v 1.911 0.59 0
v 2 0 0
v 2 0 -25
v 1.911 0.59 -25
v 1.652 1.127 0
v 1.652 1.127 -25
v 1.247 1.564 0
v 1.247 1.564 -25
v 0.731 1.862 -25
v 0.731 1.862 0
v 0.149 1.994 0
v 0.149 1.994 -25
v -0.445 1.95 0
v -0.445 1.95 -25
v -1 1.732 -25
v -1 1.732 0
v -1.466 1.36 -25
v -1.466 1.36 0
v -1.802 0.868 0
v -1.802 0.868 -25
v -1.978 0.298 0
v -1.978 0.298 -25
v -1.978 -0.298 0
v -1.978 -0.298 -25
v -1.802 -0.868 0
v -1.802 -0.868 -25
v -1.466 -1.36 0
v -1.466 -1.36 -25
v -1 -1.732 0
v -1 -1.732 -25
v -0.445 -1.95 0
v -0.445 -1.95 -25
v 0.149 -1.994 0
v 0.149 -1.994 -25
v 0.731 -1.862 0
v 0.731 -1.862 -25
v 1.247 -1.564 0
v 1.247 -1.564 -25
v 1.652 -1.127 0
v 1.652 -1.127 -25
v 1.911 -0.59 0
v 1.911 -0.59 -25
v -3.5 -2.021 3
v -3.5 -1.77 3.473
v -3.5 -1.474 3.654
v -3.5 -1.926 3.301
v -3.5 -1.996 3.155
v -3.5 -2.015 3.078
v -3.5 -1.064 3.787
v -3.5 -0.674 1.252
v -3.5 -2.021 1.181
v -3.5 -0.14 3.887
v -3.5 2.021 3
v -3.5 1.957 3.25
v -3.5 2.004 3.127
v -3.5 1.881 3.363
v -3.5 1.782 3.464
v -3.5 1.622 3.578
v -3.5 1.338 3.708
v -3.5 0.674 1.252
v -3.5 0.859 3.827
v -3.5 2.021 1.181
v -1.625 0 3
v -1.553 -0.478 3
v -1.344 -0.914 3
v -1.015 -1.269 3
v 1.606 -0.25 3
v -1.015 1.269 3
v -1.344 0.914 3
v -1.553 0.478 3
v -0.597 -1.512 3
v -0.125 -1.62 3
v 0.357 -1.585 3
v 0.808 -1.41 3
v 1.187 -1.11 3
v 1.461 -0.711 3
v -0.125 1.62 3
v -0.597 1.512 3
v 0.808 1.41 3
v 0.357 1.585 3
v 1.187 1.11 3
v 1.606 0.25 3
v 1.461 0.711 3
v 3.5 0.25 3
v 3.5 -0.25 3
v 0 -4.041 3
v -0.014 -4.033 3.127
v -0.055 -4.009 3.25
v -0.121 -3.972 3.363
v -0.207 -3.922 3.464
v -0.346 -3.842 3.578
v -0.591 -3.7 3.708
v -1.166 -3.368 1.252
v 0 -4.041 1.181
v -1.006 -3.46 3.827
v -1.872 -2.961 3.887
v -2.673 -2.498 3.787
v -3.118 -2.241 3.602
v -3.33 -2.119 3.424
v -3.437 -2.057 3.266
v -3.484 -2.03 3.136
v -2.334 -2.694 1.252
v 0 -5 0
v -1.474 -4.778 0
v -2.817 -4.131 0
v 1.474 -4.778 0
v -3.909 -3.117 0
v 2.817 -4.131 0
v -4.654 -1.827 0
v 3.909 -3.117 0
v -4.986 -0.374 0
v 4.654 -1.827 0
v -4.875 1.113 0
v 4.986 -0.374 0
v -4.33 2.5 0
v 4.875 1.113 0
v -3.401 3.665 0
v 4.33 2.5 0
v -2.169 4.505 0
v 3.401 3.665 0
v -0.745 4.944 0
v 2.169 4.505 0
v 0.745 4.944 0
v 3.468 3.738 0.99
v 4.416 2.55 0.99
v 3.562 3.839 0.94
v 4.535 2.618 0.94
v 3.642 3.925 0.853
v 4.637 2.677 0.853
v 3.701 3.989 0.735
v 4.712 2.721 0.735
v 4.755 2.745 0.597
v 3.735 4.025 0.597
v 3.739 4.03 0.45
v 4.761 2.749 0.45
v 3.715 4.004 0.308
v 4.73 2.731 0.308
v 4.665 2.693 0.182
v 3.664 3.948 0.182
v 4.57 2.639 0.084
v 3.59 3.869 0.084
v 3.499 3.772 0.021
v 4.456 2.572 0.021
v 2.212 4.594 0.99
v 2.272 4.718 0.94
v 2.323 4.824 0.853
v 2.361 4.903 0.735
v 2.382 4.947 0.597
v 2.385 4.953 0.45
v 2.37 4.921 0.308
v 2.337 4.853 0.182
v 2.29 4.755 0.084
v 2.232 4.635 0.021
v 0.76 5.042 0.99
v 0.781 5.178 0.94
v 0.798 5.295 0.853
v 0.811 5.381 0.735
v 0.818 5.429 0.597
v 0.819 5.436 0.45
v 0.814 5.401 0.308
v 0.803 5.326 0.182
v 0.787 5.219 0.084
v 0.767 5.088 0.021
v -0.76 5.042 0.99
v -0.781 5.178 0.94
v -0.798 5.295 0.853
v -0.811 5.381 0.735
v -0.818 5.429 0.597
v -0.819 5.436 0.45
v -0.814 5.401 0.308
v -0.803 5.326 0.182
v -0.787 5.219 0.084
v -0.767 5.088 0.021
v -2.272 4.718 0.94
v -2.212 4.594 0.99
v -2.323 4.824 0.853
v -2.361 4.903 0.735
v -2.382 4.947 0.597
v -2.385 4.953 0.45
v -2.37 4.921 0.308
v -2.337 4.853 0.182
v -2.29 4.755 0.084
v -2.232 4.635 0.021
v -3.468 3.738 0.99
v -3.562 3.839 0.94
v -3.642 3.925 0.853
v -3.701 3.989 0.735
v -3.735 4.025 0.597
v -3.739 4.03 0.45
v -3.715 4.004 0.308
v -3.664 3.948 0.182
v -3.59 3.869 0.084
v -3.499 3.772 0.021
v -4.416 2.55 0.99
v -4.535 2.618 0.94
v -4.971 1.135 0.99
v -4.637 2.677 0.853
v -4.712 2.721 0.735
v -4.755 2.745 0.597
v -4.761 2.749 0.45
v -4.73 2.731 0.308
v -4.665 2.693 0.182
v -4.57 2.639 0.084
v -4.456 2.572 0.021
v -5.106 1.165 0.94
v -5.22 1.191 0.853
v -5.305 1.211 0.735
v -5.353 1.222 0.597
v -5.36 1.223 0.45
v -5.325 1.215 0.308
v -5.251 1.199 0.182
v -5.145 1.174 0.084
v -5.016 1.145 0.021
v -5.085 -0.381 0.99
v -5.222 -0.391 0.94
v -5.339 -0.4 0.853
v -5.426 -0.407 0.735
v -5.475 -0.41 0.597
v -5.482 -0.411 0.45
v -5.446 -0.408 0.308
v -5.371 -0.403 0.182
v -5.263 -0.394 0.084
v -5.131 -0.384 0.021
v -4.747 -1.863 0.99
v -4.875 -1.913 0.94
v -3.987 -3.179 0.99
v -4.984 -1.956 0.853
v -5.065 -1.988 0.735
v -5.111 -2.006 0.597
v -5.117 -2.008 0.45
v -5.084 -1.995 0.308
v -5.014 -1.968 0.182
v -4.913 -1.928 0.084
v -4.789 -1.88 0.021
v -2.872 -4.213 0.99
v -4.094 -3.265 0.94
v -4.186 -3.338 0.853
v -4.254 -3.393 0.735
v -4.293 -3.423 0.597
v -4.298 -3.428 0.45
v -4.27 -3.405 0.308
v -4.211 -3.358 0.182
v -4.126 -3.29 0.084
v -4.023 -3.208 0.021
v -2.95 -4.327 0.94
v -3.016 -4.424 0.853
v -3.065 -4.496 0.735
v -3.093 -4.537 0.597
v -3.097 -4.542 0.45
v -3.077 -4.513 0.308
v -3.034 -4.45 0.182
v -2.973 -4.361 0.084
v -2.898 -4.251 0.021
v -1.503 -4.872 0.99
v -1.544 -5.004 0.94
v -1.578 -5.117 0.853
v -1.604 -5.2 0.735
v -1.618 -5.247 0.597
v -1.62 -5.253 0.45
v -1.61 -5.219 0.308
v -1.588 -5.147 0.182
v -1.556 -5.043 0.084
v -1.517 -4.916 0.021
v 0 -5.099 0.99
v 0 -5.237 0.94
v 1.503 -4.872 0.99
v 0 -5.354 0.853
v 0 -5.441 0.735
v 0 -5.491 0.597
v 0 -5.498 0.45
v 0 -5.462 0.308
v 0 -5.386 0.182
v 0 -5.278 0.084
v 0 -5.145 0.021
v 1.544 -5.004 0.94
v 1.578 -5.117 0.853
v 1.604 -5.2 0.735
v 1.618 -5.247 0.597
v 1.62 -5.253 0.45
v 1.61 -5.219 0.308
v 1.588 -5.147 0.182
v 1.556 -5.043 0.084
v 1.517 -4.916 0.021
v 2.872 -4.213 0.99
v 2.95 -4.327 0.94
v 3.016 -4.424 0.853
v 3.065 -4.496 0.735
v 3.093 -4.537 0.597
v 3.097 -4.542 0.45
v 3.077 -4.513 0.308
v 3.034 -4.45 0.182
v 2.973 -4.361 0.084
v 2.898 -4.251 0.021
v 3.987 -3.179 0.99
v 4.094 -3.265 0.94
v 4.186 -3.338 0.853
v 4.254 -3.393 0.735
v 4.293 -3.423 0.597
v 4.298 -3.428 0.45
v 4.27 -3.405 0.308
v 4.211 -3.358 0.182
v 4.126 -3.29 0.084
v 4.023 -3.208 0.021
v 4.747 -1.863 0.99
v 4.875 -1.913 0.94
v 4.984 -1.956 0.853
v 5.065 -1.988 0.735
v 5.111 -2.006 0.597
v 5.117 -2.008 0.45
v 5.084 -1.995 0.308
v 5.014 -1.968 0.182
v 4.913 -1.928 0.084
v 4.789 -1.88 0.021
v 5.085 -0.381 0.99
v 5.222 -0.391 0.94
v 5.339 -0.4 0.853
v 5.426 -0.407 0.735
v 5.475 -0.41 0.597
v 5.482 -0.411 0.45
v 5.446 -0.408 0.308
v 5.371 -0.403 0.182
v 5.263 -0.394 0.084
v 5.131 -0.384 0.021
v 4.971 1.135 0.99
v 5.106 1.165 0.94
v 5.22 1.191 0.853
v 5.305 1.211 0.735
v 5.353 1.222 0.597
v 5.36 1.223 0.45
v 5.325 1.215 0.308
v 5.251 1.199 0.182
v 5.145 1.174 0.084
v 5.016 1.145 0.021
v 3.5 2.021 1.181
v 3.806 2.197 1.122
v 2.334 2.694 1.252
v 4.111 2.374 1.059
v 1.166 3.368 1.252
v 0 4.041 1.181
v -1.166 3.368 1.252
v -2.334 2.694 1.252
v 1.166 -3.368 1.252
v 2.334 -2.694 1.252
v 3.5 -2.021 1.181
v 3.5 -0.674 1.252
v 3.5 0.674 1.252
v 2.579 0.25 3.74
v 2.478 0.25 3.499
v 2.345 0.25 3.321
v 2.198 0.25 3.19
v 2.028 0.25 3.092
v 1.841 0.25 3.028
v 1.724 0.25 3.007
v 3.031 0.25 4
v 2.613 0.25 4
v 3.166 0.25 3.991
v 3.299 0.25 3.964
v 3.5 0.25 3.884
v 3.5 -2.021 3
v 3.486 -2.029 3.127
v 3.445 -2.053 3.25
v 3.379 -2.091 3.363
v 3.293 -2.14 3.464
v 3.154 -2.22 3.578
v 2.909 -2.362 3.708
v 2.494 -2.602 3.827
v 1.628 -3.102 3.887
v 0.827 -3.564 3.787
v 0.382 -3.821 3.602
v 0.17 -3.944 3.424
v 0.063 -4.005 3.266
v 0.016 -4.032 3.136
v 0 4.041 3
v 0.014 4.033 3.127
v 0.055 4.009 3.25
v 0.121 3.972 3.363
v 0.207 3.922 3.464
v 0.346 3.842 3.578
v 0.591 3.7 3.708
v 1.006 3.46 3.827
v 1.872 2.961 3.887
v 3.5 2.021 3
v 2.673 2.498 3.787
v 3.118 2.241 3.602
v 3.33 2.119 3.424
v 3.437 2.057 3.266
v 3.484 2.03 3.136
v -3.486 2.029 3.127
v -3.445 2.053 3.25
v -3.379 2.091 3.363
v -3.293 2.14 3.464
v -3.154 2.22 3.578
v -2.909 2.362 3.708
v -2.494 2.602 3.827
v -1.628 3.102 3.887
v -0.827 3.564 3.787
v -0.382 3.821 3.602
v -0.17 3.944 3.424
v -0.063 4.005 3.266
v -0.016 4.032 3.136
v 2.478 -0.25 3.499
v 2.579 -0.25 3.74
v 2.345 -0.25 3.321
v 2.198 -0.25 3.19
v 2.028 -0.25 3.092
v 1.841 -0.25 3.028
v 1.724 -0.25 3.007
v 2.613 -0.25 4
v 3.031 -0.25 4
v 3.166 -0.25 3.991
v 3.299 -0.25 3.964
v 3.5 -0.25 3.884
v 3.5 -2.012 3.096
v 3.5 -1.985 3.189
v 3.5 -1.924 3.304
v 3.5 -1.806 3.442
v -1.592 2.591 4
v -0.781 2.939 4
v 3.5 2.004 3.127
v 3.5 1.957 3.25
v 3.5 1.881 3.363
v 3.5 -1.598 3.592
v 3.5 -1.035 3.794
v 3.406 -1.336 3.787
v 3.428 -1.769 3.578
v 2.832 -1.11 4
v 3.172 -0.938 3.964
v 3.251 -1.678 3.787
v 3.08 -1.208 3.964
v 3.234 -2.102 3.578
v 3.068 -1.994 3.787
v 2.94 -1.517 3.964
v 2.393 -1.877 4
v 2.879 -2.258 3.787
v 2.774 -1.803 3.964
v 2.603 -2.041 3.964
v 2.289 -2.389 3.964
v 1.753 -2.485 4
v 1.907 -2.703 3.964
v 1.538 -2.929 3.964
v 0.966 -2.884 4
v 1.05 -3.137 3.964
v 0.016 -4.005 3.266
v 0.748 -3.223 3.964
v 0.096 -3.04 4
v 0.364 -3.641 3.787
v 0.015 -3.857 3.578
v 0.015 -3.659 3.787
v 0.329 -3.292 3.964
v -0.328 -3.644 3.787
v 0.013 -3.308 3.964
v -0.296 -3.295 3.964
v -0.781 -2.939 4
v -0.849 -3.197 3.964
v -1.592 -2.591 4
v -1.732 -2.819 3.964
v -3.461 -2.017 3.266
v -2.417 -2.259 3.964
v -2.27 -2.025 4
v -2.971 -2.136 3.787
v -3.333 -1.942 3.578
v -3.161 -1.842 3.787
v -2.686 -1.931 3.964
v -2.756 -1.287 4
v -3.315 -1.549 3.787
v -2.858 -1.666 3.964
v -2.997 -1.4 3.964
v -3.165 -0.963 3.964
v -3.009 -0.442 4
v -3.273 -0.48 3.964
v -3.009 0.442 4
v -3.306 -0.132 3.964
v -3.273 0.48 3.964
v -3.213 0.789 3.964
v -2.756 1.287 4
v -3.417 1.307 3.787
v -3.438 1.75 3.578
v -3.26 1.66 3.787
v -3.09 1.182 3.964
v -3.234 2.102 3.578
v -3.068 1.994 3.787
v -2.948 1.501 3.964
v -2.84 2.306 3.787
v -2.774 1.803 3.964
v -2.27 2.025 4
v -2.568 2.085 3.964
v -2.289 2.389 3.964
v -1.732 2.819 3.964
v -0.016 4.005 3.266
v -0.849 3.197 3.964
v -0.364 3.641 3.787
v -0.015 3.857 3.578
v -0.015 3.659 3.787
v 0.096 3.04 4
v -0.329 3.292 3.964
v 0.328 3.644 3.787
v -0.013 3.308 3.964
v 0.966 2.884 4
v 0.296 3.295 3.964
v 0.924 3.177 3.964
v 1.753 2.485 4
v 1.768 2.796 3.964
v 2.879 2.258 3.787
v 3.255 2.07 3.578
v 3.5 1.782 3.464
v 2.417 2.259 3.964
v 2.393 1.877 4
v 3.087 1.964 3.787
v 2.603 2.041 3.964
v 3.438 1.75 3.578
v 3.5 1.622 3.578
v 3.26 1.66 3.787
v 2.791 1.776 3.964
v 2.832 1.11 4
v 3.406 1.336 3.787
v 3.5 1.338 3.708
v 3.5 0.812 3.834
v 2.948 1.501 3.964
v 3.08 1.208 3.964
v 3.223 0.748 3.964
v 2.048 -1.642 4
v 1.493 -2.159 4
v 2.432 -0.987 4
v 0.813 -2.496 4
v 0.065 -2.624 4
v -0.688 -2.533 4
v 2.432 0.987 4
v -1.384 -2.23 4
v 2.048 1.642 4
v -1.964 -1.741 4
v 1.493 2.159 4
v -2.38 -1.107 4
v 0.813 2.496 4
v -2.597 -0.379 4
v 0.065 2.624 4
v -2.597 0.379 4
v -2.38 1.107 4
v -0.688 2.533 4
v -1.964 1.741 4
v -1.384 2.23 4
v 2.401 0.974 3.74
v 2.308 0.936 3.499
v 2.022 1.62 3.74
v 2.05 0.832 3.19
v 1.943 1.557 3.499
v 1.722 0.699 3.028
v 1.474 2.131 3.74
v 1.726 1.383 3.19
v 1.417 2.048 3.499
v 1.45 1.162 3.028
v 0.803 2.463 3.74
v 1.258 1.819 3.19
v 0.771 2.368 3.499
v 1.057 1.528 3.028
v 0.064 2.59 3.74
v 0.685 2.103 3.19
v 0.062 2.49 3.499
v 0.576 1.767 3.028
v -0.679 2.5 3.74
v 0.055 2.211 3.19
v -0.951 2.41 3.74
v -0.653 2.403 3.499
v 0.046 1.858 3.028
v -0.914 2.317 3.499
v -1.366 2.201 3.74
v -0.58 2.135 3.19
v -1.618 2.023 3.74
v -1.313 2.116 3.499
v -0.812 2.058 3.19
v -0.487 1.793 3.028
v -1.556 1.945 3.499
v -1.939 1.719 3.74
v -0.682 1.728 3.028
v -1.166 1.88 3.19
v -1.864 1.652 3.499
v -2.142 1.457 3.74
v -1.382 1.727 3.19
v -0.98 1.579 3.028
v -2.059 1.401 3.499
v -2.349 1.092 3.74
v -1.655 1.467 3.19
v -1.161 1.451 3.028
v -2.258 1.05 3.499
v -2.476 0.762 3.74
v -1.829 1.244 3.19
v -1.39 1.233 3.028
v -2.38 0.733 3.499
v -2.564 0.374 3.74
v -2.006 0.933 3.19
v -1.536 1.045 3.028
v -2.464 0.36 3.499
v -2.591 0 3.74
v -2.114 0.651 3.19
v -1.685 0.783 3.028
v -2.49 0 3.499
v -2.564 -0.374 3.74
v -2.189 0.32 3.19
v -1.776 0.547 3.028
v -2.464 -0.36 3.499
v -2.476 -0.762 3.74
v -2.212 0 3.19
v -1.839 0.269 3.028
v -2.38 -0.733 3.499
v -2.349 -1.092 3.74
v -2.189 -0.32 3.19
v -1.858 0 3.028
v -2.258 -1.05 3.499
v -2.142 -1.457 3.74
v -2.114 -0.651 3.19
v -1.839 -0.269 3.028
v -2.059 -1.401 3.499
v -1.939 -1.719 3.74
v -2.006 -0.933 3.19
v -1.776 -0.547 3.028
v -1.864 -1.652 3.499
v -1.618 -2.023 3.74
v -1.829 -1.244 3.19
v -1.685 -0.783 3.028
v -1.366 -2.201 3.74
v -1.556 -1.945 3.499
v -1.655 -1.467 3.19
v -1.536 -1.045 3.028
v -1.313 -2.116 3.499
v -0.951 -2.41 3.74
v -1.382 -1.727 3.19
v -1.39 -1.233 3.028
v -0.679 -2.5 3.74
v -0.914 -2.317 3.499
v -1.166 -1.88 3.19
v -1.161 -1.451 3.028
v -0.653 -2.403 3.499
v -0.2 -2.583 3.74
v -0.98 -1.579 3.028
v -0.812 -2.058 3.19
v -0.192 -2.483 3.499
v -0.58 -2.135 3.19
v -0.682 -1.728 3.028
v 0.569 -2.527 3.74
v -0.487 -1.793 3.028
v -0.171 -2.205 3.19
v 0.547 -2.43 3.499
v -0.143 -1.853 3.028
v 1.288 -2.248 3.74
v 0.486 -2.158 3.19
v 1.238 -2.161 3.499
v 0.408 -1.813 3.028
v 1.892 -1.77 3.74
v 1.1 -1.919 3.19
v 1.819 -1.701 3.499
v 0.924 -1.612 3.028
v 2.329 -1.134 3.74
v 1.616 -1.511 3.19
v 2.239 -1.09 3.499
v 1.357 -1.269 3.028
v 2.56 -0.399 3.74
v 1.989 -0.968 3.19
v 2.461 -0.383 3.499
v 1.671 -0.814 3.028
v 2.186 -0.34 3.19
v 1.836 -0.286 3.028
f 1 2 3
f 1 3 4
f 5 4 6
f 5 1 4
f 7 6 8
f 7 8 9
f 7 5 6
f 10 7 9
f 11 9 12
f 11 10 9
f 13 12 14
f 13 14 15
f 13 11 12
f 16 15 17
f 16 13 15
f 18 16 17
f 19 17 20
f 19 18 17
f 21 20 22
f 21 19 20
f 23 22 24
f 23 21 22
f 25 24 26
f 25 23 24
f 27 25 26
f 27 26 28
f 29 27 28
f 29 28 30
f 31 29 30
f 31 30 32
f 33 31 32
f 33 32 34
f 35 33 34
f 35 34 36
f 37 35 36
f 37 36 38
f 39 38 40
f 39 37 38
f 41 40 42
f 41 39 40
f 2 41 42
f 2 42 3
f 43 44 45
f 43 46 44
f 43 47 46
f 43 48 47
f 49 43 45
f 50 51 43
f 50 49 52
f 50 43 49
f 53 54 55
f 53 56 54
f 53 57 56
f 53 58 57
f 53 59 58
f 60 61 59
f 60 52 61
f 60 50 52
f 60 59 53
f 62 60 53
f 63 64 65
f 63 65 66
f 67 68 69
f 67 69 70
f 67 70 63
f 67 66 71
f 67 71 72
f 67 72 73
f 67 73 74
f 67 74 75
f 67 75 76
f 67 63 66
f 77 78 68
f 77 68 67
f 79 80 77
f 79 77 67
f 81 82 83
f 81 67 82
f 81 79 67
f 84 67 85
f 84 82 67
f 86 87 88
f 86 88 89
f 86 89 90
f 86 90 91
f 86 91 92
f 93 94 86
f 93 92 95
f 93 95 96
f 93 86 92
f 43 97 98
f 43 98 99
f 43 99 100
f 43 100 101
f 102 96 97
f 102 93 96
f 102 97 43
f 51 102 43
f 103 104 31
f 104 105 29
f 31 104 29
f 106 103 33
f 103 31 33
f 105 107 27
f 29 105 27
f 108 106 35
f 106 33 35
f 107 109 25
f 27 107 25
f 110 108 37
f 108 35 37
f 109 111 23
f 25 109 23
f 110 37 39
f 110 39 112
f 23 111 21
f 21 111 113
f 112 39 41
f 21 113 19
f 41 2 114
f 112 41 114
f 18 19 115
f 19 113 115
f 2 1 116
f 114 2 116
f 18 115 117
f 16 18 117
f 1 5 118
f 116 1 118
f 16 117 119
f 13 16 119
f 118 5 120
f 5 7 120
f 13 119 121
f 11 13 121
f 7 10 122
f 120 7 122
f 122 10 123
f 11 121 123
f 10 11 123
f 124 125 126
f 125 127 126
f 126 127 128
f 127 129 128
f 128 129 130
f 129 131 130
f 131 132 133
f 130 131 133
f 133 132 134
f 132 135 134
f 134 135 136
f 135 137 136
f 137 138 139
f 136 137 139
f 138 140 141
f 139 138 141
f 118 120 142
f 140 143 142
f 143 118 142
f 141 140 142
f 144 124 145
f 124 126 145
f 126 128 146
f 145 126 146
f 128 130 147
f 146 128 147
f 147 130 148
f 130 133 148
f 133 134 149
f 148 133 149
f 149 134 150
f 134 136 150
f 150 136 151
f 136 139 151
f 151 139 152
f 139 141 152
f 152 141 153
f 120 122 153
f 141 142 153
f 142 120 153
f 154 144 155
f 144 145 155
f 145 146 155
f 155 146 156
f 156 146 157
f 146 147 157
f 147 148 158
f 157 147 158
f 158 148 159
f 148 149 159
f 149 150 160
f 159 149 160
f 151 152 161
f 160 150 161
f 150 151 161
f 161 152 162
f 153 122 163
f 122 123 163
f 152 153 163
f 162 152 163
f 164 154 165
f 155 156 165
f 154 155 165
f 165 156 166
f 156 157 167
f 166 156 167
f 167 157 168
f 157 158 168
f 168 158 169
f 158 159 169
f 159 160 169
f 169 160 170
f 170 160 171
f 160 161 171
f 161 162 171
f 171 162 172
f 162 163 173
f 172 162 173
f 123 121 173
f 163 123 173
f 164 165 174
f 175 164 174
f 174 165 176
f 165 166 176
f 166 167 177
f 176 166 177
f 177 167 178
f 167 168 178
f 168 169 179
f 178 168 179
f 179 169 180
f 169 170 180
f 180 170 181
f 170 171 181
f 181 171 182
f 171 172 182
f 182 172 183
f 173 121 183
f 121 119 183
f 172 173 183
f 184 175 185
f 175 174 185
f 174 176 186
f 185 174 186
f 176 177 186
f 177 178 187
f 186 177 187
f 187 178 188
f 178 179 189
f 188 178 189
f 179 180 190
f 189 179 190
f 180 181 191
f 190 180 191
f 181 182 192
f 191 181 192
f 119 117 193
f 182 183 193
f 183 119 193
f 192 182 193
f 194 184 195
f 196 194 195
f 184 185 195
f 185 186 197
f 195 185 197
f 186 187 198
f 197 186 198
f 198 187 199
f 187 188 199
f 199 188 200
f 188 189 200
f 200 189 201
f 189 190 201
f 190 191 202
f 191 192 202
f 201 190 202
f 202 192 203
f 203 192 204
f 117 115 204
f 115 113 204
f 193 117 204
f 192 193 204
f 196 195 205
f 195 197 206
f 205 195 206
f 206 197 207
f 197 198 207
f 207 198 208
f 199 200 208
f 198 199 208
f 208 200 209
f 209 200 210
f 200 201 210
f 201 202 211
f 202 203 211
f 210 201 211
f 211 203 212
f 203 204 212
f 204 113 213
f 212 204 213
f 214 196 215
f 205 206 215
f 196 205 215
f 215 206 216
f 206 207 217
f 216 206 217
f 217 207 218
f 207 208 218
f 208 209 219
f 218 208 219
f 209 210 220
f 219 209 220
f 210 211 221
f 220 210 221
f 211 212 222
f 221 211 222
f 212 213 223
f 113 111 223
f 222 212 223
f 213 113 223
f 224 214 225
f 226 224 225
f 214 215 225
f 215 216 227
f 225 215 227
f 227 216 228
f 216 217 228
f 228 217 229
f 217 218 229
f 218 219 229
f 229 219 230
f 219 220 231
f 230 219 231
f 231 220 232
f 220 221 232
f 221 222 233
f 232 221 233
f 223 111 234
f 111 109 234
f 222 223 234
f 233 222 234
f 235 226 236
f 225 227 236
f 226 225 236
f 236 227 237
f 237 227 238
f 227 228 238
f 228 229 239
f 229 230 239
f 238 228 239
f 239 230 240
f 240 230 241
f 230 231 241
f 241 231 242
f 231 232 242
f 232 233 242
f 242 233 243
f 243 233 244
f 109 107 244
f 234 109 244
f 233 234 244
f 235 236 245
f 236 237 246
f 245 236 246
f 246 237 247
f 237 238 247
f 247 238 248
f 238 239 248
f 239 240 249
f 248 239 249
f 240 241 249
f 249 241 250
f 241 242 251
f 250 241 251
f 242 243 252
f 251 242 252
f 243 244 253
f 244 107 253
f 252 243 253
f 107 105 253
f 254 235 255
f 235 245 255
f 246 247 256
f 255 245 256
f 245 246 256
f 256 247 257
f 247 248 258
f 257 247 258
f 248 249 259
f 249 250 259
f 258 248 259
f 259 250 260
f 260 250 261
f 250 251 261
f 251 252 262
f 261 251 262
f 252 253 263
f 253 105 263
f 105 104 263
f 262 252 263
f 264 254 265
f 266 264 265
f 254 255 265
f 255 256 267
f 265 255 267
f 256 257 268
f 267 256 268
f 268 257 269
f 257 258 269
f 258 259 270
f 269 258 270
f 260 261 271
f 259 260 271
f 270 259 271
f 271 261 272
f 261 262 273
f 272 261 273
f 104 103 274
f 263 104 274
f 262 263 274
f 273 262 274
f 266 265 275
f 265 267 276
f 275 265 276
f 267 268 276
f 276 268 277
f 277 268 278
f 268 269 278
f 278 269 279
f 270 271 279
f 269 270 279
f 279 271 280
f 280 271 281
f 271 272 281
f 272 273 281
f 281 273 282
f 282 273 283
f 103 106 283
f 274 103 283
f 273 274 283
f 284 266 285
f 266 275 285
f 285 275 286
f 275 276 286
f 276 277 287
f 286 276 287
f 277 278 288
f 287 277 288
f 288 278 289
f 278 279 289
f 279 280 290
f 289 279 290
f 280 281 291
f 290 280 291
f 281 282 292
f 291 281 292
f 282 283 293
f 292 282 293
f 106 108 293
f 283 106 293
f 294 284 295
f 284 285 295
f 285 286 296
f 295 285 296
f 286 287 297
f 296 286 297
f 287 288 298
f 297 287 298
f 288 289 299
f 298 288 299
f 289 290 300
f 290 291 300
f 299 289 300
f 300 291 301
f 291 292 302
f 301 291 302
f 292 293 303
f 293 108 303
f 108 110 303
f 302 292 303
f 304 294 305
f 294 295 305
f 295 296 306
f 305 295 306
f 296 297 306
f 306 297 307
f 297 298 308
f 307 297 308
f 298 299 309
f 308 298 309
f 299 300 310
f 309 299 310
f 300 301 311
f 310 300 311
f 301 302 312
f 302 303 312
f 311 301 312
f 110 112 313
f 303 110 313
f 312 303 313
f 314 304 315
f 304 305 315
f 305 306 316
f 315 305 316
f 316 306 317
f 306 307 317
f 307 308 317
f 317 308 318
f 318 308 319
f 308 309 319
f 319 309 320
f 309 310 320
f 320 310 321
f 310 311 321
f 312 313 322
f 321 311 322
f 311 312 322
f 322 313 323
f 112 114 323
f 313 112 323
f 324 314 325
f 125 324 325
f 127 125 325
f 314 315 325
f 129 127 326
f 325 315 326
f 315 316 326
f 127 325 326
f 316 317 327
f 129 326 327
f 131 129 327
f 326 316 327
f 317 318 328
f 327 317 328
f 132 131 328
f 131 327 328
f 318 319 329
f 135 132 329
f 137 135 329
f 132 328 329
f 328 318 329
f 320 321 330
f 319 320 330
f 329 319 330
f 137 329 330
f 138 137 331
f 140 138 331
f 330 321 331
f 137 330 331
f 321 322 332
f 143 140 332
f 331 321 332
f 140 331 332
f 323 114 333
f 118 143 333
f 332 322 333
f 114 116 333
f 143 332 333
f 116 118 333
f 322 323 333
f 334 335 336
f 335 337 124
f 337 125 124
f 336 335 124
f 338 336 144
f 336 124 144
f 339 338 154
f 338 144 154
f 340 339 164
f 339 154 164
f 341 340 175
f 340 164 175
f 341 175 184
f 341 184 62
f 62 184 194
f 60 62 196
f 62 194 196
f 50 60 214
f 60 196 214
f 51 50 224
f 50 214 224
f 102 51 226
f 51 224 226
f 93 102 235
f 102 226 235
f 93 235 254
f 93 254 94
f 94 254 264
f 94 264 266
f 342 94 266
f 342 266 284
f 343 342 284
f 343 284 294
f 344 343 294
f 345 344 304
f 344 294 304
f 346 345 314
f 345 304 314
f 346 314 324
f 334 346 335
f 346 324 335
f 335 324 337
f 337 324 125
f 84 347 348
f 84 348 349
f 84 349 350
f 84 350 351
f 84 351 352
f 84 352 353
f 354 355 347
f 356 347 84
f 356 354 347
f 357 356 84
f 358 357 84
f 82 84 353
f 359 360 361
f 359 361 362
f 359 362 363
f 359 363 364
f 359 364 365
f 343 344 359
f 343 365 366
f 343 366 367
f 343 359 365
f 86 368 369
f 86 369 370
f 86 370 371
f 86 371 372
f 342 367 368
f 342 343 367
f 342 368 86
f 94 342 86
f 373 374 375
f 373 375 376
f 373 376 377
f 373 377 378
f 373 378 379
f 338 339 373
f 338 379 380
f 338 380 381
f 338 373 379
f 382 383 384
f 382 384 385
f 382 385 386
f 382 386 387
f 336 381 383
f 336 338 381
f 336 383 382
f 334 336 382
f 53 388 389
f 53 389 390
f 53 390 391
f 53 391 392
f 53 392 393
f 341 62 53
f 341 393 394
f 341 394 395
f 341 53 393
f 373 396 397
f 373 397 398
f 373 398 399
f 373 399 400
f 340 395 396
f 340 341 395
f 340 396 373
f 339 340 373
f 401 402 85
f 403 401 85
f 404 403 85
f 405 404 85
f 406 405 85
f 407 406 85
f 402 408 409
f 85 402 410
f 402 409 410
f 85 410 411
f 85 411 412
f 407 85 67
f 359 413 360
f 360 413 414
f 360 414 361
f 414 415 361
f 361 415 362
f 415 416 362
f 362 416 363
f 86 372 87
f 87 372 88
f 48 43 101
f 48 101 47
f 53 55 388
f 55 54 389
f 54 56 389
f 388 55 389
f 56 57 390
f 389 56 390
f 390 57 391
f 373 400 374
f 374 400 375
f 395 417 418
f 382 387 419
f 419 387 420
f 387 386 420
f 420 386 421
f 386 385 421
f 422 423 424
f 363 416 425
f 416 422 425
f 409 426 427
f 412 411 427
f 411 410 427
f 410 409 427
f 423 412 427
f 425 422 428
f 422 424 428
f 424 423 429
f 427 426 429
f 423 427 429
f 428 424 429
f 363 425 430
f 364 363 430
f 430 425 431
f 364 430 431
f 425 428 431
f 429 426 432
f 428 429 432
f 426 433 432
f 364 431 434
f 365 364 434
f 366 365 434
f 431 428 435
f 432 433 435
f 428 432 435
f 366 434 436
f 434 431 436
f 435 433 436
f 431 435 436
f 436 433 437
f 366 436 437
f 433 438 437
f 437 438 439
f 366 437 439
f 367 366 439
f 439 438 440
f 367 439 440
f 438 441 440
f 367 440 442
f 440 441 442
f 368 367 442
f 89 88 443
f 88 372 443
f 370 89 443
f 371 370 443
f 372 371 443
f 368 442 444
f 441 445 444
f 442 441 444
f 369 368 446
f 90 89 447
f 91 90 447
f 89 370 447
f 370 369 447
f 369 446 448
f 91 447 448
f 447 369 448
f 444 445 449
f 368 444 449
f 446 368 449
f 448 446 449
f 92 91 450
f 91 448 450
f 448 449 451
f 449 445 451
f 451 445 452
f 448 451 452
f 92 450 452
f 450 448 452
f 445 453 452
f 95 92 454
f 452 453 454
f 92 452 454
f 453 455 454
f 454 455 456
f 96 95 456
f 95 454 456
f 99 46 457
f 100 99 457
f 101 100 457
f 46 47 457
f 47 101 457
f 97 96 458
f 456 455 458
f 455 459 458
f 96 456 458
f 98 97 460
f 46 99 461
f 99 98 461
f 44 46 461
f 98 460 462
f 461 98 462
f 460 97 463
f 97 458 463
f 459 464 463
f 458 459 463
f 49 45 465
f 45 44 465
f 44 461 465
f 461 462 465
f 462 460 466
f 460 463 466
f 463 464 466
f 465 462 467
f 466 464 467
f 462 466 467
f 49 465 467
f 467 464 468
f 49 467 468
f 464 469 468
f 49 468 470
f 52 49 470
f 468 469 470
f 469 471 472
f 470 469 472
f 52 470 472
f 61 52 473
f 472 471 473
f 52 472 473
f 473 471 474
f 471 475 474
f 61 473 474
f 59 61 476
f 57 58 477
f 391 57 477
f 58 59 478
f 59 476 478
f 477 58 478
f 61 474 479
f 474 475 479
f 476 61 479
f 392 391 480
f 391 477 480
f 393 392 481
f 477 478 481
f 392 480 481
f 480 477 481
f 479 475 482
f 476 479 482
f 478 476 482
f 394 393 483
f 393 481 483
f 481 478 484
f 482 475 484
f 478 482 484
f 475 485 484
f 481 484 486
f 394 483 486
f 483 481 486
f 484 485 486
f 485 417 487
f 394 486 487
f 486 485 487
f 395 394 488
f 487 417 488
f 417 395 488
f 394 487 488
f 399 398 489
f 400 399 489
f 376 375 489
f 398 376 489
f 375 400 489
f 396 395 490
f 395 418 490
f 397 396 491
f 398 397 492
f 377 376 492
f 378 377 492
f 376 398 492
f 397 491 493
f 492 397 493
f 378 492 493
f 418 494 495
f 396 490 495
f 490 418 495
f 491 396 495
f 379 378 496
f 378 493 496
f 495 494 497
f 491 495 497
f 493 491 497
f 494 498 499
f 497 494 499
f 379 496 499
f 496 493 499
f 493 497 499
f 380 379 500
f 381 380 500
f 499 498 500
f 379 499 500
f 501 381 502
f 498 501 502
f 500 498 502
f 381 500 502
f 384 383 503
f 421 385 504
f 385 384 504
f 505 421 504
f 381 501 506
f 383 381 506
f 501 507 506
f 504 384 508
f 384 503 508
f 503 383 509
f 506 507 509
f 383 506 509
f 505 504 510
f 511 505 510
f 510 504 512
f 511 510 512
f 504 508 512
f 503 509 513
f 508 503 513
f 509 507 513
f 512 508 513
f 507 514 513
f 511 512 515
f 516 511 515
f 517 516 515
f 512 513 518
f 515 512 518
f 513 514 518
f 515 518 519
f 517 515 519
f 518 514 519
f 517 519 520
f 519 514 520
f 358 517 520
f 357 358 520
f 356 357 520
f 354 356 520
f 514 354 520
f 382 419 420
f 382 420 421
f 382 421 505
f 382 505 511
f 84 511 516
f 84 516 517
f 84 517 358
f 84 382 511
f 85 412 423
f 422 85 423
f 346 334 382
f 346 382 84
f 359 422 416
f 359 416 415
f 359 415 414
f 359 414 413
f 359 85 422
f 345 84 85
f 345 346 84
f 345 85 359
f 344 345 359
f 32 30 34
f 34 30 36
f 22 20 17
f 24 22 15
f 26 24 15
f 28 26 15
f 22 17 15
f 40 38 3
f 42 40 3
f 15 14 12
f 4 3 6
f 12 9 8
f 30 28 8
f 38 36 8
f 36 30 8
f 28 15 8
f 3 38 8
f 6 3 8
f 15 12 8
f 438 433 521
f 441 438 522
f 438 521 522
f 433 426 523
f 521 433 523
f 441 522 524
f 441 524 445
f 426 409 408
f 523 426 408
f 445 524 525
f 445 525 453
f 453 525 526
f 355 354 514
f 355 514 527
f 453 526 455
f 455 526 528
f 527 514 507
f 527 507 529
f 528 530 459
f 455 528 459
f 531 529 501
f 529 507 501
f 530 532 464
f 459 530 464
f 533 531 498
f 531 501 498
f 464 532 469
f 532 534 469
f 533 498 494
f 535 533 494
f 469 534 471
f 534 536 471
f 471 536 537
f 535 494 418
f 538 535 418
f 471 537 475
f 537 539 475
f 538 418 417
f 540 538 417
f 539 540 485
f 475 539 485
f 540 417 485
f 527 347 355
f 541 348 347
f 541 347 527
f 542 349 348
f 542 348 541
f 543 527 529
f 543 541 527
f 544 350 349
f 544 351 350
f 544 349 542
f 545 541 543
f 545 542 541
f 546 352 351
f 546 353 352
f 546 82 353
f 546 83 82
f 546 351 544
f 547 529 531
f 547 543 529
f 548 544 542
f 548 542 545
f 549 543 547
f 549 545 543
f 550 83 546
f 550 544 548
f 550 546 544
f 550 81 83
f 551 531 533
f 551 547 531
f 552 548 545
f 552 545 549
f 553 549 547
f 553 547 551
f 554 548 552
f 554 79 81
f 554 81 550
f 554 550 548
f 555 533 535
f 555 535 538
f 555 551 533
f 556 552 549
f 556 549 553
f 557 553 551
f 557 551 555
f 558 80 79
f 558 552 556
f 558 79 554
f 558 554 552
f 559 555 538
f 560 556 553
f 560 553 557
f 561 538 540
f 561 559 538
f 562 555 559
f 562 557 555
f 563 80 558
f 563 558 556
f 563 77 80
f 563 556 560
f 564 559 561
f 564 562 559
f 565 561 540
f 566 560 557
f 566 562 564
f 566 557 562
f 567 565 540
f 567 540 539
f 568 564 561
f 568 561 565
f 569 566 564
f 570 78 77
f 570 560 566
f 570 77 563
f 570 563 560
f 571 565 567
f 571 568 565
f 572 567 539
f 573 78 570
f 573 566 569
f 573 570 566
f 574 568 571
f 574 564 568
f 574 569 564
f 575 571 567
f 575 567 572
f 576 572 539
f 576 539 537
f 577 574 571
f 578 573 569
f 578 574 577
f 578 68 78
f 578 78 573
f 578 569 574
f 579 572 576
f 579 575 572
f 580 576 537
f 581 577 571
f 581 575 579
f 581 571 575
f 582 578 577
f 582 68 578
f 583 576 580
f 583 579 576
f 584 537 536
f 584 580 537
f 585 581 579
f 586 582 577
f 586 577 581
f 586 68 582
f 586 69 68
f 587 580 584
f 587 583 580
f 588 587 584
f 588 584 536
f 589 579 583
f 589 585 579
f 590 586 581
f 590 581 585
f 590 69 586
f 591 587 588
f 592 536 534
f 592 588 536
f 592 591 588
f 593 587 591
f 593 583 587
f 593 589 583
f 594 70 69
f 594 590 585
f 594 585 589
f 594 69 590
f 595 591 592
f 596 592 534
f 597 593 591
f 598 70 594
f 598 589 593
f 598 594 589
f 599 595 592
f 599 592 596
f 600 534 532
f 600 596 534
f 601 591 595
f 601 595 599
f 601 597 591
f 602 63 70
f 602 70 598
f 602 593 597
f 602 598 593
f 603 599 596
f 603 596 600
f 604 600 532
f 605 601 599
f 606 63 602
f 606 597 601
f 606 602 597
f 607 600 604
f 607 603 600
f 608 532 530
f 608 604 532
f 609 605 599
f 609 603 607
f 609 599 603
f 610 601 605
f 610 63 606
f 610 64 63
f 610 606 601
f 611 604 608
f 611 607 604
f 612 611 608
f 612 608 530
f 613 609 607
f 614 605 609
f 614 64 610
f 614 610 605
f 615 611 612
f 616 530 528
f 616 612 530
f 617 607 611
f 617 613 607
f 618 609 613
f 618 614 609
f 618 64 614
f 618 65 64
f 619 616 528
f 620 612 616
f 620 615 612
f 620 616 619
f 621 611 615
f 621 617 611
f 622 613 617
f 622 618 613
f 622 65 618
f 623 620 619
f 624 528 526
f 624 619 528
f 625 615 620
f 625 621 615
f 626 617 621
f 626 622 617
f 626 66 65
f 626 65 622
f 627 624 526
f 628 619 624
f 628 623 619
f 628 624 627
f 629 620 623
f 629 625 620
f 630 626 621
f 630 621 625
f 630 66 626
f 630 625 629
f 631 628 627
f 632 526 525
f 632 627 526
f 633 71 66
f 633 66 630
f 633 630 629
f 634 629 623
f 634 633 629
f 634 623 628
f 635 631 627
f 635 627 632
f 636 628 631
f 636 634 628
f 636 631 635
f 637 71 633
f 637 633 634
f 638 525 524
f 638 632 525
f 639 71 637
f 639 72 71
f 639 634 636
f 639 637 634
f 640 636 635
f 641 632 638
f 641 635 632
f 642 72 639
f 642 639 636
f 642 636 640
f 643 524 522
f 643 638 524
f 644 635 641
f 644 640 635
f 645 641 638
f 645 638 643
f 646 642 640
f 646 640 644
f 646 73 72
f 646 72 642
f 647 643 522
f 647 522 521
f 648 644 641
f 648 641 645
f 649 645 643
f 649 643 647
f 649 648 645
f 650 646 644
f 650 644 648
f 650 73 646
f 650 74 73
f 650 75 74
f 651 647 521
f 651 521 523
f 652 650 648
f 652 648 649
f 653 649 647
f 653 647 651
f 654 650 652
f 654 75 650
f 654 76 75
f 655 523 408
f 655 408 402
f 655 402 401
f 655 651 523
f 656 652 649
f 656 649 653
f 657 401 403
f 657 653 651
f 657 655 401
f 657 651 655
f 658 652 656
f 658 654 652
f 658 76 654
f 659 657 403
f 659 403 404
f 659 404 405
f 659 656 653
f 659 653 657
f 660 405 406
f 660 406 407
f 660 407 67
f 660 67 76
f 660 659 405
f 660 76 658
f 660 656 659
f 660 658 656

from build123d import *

# Parameters (mm, degrees)
HEAD_DEPTH         = 4
SHANK_SKETCH_R     = 2
SHANK_DEPTH        = 25
SKETCH6_R          = 2.625
HEAD_CUT_DEPTH     = 1
FILLET1_R          = 1
SKETCH7_W          = 3.5
SKETCH7_H          = 0.5
CUT_EXTRUDE1_DEPTH = 1


with BuildPart() as part:
    # Head Sketch → Head (new body)
    with BuildSketch(Plane.XY):
        Polygon((0, 4.041451884), (3.5, 2.020725942), (3.5, -2.020725942), (0, -4.041451884), (-3.5, -2.020725942), (-3.5, 2.020725942), align=None)
    extrude(amount=HEAD_DEPTH)

    # Shank Sketch → Shank (add)
    with BuildSketch(Plane.XY):
        Circle(SHANK_SKETCH_R)
    extrude(amount=-SHANK_DEPTH)

    # Sketch3 → Flange (revolve)
    with BuildSketch(Plane(origin=(0, 0, 0), x_dir=(-1, 0, 0), z_dir=(0, 1, 0)), mode=Mode.PRIVATE) as flange_sk:
        with BuildLine():
            Line((-5, 0), (0, 0))
            Line((0, 0), (0, 1.5))
            ThreePointArc((0, 1.5), (-2.562220765, 1.372207648), (-5.099009901, 0.99009901))
            ThreePointArc((-5.099009901, 0.99009901), (-5.497518595, 0.45024814), (-5, 0))
        make_face()
    revolve(flange_sk.sketch.rotate(Axis((0, 0, 0), (0, 0, 1)), 30), axis=Axis((0, 0, 0), (0, 0, 1)))

    # Sketch5 → Head Trim (revolve, cut)
    with BuildSketch(Plane(origin=(0, 0, 0), x_dir=(0, 0, -1), z_dir=(1, 0, 0)), mode=Mode.PRIVATE) as head_trim_sk:
        with BuildLine():
            Line((-4, -3.041451884), (-4, -4.041451884))
            Line((-4, -4.041451884), (-3, -4.041451884))
            ThreePointArc((-3, -4.041451884), (-3.707106781, -3.748558666), (-4, -3.041451884))
        make_face()
    revolve(head_trim_sk.sketch.rotate(Axis((0, 0, 15.085599173), (0, 0, -1)), 90), axis=Axis((0, 0, 15.085599173), (0, 0, -1)), mode=Mode.SUBTRACT)

    # Sketch6 → Head Cut (cut)
    with BuildSketch(Plane.XY.offset(4)):
        Circle(SKETCH6_R)
    extrude(amount=-HEAD_CUT_DEPTH, mode=Mode.SUBTRACT)

    # Fillet1
    fillet1_edges = [part.edges().sort_by_distance(p)[0] for p in [
        (-2.625, 0, 3),
    ]]
    fillet(fillet1_edges, radius=FILLET1_R - 0.0001)  # a hair under: the kernel refuses the full size

    # Sketch7 → Cut-Extrude1 (cut)
    with BuildSketch(Plane(origin=(0.741825606, 1.407208117, 4), x_dir=(1, 0, 0), z_dir=(0, 0, 1))):
        with Locations((1.008174394, -1.407208117)):
            Rectangle(SKETCH7_W, SKETCH7_H)
    extrude(amount=-CUT_EXTRUDE1_DEPTH, mode=Mode.SUBTRACT)


solid = part.part
